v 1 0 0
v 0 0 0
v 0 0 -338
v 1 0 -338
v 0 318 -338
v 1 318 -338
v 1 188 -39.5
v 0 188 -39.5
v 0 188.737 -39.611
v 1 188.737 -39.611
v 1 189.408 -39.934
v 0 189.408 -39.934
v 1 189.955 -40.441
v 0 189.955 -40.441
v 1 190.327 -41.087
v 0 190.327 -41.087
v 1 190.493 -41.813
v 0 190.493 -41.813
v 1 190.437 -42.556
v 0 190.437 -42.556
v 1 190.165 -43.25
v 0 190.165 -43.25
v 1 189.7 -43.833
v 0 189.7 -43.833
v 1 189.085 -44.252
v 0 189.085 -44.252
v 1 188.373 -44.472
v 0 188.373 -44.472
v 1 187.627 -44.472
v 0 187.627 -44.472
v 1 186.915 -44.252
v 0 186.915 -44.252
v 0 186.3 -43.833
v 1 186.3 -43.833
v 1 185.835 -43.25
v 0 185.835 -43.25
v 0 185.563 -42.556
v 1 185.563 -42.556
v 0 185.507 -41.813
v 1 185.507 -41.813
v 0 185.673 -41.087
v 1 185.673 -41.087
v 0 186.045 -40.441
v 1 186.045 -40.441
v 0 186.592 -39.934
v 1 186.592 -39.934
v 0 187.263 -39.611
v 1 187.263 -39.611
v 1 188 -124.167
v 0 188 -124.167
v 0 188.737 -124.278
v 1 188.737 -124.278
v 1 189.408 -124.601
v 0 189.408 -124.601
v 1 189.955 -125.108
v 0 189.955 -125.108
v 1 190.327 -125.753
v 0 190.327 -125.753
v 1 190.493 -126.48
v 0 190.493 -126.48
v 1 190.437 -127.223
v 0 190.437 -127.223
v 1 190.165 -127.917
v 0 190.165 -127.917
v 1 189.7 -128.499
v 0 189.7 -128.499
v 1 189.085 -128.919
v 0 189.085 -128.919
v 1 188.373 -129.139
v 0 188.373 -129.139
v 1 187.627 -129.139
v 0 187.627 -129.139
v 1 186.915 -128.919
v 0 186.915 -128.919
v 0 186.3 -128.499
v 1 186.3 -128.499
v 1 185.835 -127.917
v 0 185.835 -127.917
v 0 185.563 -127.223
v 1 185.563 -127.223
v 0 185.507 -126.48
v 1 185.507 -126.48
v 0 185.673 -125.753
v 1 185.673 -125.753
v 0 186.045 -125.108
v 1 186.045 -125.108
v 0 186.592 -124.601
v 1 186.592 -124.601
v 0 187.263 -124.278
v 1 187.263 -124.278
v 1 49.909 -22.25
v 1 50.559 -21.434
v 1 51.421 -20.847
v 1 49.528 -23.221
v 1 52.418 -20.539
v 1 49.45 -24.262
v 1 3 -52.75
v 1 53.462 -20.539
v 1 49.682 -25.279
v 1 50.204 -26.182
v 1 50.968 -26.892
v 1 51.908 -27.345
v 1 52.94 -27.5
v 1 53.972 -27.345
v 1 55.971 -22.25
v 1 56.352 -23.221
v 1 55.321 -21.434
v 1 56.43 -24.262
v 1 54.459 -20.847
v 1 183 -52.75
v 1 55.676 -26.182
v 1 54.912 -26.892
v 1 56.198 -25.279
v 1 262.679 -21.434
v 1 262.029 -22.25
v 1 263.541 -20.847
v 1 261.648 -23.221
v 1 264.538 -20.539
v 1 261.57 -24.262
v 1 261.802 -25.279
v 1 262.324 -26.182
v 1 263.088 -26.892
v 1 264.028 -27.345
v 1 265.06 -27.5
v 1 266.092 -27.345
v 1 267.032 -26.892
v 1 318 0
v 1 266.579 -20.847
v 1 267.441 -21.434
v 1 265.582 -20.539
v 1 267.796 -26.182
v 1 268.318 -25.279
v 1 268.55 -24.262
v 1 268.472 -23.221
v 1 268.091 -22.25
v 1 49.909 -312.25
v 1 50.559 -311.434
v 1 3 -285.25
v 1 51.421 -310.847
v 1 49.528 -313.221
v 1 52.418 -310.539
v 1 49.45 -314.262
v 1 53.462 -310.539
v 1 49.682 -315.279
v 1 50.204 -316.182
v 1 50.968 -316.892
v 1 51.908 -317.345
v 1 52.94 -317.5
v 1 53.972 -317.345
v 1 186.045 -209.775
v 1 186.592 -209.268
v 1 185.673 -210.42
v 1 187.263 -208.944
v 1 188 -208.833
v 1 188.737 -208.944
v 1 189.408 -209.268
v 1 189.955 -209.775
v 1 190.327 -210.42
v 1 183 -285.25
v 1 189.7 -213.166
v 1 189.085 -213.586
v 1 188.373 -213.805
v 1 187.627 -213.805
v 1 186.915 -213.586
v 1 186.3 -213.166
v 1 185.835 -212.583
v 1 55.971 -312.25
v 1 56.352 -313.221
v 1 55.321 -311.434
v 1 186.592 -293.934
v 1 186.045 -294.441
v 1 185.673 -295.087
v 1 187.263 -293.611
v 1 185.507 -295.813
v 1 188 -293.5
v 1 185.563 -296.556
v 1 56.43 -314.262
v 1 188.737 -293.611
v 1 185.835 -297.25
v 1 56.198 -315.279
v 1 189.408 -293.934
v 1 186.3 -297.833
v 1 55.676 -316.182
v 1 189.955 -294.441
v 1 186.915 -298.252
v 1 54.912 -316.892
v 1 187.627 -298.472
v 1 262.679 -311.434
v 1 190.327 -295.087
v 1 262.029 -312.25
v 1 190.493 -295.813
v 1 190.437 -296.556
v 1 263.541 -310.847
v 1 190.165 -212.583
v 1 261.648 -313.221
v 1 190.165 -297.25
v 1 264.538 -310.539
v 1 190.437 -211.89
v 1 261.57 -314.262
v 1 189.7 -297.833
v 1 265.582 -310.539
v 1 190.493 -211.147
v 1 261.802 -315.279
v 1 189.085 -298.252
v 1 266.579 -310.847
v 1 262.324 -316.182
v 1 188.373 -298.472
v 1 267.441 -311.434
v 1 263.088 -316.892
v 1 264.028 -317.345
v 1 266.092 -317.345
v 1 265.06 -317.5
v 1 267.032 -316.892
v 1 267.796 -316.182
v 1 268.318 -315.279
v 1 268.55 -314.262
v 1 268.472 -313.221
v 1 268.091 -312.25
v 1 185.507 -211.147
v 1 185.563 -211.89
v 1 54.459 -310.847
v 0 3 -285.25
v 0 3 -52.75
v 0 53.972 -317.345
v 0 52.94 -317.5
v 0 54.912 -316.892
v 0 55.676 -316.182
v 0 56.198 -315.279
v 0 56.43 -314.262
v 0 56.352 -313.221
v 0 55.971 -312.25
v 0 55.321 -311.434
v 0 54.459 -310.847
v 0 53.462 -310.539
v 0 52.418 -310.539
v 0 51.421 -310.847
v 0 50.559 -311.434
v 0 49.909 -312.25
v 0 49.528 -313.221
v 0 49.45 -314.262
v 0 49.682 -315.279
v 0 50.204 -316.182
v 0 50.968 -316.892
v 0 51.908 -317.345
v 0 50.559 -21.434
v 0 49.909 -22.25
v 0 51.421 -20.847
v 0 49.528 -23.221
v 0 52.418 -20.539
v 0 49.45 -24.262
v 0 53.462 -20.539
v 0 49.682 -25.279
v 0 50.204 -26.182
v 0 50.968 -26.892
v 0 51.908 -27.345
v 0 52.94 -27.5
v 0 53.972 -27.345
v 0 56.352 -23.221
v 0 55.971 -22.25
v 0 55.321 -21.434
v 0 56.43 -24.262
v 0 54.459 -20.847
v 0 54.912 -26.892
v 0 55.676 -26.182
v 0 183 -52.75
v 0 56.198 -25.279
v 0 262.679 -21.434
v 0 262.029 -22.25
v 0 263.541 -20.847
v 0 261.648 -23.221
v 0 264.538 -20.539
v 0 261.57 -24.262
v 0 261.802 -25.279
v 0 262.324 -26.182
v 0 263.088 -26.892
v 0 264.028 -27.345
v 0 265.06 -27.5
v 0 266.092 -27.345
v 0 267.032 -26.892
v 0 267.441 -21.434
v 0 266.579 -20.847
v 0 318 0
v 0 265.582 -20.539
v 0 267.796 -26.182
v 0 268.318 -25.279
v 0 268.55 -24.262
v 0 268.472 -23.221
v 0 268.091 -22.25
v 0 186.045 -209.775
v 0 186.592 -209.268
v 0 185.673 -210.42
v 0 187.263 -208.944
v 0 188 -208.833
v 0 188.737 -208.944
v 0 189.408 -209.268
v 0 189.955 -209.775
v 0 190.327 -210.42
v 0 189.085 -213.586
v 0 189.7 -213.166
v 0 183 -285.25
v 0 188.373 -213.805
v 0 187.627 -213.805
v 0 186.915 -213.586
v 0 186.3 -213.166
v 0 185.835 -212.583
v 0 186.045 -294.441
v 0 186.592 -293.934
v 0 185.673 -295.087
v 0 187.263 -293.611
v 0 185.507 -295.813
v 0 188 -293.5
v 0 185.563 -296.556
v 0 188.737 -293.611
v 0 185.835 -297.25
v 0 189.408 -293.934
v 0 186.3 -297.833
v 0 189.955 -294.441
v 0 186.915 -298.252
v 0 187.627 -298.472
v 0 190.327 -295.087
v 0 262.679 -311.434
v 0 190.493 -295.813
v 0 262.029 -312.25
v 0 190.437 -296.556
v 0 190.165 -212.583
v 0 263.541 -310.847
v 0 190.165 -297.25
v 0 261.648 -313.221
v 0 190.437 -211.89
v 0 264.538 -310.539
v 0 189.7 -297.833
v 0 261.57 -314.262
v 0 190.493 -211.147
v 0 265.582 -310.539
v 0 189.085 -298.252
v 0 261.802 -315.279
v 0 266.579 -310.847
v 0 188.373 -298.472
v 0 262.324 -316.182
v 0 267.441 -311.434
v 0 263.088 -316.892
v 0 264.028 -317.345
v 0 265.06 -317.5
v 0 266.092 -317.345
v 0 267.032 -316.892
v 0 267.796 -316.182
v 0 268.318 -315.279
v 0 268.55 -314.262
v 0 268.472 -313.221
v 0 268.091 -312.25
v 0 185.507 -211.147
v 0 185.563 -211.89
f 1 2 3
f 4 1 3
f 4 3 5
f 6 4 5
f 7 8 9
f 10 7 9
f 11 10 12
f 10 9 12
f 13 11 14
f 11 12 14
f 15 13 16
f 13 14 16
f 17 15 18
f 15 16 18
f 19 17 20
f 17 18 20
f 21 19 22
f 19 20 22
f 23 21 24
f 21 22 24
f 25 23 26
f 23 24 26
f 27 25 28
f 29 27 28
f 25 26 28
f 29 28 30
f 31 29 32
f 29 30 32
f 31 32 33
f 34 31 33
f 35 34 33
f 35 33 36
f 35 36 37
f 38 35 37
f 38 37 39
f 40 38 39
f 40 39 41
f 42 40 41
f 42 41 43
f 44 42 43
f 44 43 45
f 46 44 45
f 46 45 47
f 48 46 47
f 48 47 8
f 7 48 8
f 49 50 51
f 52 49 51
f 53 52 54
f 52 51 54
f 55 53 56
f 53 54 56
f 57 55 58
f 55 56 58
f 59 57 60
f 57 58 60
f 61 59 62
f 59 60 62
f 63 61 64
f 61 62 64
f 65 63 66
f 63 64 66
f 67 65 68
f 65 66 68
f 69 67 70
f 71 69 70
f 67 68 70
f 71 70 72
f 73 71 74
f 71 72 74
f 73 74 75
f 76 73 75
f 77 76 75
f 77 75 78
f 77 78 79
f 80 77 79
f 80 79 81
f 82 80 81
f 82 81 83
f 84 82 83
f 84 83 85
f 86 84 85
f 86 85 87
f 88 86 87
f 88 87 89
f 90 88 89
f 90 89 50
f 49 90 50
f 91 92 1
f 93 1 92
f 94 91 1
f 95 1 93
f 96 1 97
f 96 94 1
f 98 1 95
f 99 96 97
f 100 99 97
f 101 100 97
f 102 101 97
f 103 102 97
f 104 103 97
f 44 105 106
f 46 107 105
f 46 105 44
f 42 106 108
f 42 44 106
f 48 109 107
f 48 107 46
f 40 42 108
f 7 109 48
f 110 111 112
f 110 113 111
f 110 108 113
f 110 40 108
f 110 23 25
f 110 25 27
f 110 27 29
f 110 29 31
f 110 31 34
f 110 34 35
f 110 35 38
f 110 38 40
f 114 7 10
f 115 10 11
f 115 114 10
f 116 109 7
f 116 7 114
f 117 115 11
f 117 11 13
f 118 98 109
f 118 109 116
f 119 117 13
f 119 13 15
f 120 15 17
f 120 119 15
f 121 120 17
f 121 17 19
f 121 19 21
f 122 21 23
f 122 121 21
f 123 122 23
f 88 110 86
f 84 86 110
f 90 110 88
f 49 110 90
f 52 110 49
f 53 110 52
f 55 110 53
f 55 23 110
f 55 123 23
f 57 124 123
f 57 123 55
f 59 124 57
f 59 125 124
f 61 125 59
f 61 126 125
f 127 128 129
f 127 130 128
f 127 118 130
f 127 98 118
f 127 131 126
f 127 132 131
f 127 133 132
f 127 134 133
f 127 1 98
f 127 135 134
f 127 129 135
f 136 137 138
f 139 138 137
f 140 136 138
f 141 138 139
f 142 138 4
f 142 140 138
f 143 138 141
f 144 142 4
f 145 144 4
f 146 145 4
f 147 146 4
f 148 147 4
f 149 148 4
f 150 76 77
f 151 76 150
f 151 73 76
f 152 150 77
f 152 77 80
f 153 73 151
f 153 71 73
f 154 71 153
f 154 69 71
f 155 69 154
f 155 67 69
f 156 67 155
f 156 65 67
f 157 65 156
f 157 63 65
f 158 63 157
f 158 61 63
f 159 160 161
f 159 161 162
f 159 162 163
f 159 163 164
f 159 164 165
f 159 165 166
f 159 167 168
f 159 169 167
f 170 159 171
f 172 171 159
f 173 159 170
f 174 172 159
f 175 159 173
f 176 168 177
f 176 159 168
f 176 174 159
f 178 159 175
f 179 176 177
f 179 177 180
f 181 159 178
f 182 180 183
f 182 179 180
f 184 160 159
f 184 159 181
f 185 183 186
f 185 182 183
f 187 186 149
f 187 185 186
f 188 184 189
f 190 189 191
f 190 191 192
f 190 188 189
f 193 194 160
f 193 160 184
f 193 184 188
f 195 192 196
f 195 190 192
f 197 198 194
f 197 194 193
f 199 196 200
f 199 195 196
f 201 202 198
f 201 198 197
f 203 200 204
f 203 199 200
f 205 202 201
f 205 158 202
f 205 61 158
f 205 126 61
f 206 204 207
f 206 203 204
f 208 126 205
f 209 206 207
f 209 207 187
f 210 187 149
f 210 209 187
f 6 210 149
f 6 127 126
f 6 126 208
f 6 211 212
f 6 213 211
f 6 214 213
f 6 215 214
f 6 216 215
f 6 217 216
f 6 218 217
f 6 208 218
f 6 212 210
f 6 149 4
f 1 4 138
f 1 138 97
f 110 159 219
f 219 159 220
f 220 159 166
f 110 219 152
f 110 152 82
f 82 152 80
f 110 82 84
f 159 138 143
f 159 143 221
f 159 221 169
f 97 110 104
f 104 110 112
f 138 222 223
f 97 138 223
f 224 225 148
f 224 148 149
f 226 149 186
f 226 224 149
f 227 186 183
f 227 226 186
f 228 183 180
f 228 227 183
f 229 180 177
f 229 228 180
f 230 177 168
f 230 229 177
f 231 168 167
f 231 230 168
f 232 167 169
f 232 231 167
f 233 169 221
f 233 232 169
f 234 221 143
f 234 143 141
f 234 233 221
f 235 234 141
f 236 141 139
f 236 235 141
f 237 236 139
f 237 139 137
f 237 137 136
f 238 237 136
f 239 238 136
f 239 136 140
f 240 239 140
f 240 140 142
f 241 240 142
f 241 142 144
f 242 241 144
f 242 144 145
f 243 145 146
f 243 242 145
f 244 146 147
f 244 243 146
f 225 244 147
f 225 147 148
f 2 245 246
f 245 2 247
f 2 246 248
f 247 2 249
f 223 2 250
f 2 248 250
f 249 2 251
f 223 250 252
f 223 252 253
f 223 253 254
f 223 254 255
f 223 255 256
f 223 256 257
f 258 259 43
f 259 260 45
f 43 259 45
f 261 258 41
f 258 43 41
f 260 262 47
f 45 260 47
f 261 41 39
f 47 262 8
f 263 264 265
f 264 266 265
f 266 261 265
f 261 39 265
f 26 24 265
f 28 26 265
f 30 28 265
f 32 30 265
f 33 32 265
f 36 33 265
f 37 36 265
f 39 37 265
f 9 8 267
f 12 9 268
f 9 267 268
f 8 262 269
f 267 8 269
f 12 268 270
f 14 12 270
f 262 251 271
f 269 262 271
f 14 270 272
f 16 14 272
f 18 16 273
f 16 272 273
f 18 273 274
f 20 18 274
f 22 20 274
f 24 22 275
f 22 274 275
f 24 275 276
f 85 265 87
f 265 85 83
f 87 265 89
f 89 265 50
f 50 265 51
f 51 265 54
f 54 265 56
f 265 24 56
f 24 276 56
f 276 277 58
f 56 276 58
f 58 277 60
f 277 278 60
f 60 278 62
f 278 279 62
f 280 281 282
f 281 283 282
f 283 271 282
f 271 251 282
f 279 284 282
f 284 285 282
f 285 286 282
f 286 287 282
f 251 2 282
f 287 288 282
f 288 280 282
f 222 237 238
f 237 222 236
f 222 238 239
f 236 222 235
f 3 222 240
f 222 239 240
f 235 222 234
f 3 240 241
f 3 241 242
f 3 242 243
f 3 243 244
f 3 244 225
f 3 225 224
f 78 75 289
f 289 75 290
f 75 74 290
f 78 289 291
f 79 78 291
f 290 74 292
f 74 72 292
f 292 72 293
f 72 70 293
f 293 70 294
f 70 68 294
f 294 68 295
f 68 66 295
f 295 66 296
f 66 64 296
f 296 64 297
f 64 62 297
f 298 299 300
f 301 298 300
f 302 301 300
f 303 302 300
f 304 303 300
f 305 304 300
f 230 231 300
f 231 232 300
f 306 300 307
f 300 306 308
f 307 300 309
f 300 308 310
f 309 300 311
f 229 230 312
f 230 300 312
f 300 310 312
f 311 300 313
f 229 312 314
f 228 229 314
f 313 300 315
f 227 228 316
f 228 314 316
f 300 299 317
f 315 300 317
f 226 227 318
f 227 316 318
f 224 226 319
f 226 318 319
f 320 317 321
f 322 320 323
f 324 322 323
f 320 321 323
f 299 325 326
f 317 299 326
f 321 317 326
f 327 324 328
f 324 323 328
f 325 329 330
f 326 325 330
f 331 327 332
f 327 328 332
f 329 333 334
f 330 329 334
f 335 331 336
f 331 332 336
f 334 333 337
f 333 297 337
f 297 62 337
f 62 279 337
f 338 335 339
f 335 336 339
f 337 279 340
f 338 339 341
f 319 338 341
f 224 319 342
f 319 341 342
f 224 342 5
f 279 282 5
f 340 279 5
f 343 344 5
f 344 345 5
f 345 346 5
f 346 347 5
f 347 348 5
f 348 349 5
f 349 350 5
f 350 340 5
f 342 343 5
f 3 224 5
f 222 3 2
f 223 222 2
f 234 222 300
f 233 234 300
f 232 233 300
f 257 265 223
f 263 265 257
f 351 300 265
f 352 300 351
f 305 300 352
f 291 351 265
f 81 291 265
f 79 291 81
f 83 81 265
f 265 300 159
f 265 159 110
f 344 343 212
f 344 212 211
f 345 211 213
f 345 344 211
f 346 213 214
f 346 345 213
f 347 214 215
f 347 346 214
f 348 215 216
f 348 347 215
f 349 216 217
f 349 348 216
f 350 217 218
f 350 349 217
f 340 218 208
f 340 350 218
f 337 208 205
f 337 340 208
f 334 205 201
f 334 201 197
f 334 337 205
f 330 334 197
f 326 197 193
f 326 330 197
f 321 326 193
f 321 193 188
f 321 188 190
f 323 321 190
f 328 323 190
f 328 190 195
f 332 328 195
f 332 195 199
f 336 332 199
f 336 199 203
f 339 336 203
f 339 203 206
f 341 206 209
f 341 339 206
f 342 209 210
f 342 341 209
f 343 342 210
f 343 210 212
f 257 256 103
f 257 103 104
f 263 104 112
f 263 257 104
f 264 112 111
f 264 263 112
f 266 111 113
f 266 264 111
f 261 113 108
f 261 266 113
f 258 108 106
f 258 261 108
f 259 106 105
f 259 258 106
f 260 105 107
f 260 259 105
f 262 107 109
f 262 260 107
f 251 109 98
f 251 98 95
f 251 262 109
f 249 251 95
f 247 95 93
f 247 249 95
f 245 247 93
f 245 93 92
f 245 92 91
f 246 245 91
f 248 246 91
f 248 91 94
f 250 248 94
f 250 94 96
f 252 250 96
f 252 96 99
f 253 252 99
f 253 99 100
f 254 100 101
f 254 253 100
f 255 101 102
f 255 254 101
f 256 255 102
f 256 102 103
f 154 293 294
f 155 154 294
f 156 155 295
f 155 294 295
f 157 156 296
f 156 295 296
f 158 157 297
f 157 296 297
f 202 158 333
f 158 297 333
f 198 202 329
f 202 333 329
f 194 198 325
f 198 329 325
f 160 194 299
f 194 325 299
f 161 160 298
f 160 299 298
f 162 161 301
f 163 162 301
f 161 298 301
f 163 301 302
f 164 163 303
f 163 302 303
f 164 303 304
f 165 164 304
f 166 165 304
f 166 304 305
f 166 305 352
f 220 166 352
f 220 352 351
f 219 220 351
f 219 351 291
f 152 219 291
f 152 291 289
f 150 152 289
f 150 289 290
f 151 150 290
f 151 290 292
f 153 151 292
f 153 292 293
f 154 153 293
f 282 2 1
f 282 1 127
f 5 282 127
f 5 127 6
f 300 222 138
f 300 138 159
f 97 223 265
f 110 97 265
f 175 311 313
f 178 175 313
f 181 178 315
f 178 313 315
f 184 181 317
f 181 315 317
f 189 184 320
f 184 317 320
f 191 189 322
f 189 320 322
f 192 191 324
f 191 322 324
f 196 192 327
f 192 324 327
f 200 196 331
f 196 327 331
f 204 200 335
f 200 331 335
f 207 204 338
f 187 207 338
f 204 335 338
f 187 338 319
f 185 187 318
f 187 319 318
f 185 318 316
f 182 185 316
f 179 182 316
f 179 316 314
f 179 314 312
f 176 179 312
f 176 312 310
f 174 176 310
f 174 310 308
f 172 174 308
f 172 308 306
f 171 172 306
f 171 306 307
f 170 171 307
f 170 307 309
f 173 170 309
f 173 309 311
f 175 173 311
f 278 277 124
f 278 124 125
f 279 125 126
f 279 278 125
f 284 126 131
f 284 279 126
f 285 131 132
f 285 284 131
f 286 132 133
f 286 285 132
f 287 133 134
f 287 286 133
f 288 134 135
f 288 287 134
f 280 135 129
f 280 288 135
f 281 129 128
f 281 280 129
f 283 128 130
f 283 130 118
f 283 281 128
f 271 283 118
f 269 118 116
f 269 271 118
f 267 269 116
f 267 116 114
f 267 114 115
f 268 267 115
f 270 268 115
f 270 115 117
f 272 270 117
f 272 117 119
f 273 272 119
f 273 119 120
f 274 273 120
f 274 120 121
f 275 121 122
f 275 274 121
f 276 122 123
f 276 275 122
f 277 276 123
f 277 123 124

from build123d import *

# Parameters (mm, degrees)
SKETCH1_W           = 338
SKETCH1_H           = 318
SKETCH1_R           = 3.5
BOSS_EXTRUDE1_DEPTH = 1
SKETCH2_R           = 2.5
SKETCH2_W           = 232.5
SKETCH2_H           = 180
CUT_EXTRUDE1_DEPTH  = 2


with BuildPart() as part:
    # Sketch1 → Boss-Extrude1 (new body)
    with BuildSketch(Plane(origin=(0, 0, 0), x_dir=(0, 0, -1), z_dir=(1, 0, 0))):
        with Locations((169, 159)):
            Rectangle(SKETCH1_W, SKETCH1_H)
        with Locations((24, 265.06)):
            Circle(SKETCH1_R, mode=Mode.SUBTRACT)
        with Locations((314, 265.06)):
            Circle(SKETCH1_R, mode=Mode.SUBTRACT)
        with Locations((314, 52.94)):
            Circle(SKETCH1_R, mode=Mode.SUBTRACT)
        with Locations((24, 52.94)):
            Circle(SKETCH1_R, mode=Mode.SUBTRACT)
    extrude(amount=BOSS_EXTRUDE1_DEPTH)

    # Sketch2 → Cut-Extrude1 (cut, through all)
    with BuildSketch(Plane.ZY):
        with Locations((-296, 188)):
            Circle(SKETCH2_R)
        with Locations((-211.333333333, 188)):
            Circle(SKETCH2_R)
        with Locations((-126.666666667, 188)):
            Circle(SKETCH2_R)
        with Locations((-42, 188)):
            Circle(SKETCH2_R)
        with Locations((-169, 93)):
            Rectangle(SKETCH2_W, SKETCH2_H)
    extrude(amount=-CUT_EXTRUDE1_DEPTH, mode=Mode.SUBTRACT)


solid = part.part
